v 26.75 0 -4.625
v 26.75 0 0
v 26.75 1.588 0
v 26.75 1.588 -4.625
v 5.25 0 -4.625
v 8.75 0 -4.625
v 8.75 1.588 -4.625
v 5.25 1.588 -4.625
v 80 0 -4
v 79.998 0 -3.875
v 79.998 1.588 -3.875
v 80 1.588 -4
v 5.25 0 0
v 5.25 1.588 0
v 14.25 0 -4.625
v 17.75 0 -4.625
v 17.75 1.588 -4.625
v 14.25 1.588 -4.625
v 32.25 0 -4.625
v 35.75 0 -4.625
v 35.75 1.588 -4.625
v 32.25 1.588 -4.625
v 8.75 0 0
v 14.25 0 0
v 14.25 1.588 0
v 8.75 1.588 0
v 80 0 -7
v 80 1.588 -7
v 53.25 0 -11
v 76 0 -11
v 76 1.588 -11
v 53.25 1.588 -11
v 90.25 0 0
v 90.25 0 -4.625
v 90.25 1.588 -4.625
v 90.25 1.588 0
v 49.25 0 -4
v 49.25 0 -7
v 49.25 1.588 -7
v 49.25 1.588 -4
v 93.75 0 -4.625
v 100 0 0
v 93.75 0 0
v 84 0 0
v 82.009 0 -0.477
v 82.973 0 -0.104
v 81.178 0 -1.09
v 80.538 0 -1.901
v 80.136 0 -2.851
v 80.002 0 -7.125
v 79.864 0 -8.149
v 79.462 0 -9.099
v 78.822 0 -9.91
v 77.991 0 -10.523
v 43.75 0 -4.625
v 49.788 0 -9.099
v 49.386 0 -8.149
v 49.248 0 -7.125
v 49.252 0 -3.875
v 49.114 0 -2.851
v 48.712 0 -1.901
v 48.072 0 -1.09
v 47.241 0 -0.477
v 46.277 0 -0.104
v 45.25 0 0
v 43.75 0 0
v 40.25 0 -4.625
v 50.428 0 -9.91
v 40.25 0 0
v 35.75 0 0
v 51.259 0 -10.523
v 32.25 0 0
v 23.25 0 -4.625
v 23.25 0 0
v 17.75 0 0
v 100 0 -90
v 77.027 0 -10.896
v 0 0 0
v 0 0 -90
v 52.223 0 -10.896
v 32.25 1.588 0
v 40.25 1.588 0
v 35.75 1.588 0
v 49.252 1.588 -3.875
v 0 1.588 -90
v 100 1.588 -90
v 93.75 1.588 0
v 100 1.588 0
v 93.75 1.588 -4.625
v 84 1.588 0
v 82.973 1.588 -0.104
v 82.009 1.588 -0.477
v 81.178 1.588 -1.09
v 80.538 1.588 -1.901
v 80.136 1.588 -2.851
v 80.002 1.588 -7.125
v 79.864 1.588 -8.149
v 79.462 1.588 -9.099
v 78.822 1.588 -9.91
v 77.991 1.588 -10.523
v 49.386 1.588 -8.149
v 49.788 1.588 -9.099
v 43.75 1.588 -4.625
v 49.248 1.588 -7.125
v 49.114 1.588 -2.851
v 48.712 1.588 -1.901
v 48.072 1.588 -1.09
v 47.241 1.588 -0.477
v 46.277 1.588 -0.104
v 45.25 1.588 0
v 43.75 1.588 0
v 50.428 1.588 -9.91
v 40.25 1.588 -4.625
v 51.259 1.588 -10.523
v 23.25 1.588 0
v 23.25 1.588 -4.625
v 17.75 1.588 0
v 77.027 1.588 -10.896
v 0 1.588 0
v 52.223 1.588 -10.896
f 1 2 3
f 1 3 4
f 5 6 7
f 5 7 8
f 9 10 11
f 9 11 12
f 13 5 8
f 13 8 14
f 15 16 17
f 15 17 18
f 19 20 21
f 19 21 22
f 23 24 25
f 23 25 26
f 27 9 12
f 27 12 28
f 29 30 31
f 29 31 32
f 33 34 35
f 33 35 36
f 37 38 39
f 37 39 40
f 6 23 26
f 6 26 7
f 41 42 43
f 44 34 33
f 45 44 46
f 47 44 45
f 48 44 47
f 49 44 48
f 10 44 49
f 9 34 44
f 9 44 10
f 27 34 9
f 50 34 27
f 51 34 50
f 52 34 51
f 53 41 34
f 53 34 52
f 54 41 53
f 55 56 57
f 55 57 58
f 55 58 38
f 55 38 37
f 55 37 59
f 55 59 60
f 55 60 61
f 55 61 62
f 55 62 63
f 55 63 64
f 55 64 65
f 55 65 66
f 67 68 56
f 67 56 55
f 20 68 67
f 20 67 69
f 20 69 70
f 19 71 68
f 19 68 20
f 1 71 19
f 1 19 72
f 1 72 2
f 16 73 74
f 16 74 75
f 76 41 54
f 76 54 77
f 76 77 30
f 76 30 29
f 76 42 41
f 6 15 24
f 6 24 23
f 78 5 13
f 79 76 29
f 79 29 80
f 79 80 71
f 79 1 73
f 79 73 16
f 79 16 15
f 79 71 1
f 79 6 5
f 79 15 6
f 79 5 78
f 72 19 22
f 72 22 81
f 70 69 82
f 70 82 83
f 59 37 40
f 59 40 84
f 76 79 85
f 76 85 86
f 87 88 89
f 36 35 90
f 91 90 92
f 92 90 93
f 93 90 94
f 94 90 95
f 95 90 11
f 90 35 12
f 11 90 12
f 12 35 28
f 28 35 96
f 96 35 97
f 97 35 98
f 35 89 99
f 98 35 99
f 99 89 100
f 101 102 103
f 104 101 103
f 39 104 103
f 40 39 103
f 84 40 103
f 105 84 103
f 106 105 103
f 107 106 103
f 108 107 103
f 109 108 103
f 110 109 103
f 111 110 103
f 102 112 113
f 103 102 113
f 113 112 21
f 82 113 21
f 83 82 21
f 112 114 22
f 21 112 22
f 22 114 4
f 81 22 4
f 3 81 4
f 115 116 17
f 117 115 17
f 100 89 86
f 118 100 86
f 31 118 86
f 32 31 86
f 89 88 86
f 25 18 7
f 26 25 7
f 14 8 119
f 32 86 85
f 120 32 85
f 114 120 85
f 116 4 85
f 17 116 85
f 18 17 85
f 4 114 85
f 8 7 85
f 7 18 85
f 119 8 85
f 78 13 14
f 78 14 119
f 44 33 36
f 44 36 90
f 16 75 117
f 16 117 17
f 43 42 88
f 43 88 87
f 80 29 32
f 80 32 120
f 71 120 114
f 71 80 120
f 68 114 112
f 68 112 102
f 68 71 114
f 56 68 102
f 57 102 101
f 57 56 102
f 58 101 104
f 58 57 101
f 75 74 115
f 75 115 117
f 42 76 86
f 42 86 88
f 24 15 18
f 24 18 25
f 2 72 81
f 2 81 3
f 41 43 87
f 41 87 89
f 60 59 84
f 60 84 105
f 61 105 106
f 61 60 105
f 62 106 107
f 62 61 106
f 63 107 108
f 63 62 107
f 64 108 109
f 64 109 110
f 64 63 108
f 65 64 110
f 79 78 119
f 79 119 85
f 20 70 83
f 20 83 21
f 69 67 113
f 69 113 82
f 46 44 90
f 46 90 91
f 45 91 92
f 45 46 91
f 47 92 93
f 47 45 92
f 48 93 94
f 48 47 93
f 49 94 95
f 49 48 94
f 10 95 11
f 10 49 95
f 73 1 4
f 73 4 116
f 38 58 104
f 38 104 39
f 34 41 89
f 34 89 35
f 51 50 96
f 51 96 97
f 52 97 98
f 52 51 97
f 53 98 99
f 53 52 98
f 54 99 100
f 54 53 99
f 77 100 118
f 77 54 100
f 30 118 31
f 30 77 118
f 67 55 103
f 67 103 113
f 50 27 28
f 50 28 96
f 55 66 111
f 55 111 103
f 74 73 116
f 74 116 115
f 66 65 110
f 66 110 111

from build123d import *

# Parameters (mm, degrees)
BOSS_EXTRUDE1_DEPTH = 1.5875


with BuildPart() as part:
    # Sketch1 → Boss-Extrude1 (new body)
    with BuildSketch(Plane(origin=(0, 0, 0), x_dir=(1, 0, 0), z_dir=(0, 1, 0))):
        with BuildLine():
            Line((0, 90), (100, 90))
            Line((100, 90), (100, 0))
            Line((100, 0), (93.75, 0))
            Line((93.75, 0), (93.75, 4.625))
            Line((93.75, 4.625), (90.25, 4.625))
            Line((90.25, 4.625), (90.25, 0))
            Line((90.25, 0), (84, 0))
            ThreePointArc((84, 0), (81.178095625, 1.089694192), (79.99799, 3.875))
            Line((79.99799, 3.875), (80, 4))
            Line((80, 4), (80, 7))
            Line((80, 7), (80.00201, 7.125))
            ThreePointArc((80.00201, 7.125), (78.821904375, 9.910305808), (76, 11))
            Line((76, 11), (53.25, 11))
            ThreePointArc((53.25, 11), (50.428095625, 9.910305808), (49.24799, 7.125))
            Line((49.24799, 7.125), (49.25, 7))
            Line((49.25, 7), (49.25, 4))
            Line((49.25, 4), (49.25201, 3.87502))
            ThreePointArc((49.25201, 3.87502), (48.071906674, 1.089706193), (45.25, 0))
            Line((45.25, 0), (43.75, 0))
            Line((43.75, 0), (43.75, 4.625))
            Line((43.75, 4.625), (40.25, 4.625))
            Line((40.25, 4.625), (40.25, 0))
            Line((40.25, 0), (35.75, 0))
            Line((35.75, 0), (35.75, 4.625))
            Line((35.75, 4.625), (32.25, 4.625))
            Line((32.25, 4.625), (32.25, 0))
            Line((32.25, 0), (26.75, 0))
            Line((26.75, 0), (26.75, 4.625))
            Line((26.75, 4.625), (23.25, 4.625))
            Line((23.25, 4.625), (23.25, 0))
            Line((23.25, 0), (17.75, 0))
            Line((17.75, 0), (17.75, 4.625))
            Line((17.75, 4.625), (14.25, 4.625))
            Line((14.25, 4.625), (14.25, 0))
            Line((14.25, 0), (8.75, 0))
            Line((8.75, 0), (8.75, 4.625))
            Line((8.75, 4.625), (5.25, 4.625))
            Line((5.25, 4.625), (5.25, 0))
            Line((5.25, 0), (0, 0))
            Line((0, 0), (0, 90))
        make_face()
    extrude(amount=BOSS_EXTRUDE1_DEPTH)


solid = part.part
